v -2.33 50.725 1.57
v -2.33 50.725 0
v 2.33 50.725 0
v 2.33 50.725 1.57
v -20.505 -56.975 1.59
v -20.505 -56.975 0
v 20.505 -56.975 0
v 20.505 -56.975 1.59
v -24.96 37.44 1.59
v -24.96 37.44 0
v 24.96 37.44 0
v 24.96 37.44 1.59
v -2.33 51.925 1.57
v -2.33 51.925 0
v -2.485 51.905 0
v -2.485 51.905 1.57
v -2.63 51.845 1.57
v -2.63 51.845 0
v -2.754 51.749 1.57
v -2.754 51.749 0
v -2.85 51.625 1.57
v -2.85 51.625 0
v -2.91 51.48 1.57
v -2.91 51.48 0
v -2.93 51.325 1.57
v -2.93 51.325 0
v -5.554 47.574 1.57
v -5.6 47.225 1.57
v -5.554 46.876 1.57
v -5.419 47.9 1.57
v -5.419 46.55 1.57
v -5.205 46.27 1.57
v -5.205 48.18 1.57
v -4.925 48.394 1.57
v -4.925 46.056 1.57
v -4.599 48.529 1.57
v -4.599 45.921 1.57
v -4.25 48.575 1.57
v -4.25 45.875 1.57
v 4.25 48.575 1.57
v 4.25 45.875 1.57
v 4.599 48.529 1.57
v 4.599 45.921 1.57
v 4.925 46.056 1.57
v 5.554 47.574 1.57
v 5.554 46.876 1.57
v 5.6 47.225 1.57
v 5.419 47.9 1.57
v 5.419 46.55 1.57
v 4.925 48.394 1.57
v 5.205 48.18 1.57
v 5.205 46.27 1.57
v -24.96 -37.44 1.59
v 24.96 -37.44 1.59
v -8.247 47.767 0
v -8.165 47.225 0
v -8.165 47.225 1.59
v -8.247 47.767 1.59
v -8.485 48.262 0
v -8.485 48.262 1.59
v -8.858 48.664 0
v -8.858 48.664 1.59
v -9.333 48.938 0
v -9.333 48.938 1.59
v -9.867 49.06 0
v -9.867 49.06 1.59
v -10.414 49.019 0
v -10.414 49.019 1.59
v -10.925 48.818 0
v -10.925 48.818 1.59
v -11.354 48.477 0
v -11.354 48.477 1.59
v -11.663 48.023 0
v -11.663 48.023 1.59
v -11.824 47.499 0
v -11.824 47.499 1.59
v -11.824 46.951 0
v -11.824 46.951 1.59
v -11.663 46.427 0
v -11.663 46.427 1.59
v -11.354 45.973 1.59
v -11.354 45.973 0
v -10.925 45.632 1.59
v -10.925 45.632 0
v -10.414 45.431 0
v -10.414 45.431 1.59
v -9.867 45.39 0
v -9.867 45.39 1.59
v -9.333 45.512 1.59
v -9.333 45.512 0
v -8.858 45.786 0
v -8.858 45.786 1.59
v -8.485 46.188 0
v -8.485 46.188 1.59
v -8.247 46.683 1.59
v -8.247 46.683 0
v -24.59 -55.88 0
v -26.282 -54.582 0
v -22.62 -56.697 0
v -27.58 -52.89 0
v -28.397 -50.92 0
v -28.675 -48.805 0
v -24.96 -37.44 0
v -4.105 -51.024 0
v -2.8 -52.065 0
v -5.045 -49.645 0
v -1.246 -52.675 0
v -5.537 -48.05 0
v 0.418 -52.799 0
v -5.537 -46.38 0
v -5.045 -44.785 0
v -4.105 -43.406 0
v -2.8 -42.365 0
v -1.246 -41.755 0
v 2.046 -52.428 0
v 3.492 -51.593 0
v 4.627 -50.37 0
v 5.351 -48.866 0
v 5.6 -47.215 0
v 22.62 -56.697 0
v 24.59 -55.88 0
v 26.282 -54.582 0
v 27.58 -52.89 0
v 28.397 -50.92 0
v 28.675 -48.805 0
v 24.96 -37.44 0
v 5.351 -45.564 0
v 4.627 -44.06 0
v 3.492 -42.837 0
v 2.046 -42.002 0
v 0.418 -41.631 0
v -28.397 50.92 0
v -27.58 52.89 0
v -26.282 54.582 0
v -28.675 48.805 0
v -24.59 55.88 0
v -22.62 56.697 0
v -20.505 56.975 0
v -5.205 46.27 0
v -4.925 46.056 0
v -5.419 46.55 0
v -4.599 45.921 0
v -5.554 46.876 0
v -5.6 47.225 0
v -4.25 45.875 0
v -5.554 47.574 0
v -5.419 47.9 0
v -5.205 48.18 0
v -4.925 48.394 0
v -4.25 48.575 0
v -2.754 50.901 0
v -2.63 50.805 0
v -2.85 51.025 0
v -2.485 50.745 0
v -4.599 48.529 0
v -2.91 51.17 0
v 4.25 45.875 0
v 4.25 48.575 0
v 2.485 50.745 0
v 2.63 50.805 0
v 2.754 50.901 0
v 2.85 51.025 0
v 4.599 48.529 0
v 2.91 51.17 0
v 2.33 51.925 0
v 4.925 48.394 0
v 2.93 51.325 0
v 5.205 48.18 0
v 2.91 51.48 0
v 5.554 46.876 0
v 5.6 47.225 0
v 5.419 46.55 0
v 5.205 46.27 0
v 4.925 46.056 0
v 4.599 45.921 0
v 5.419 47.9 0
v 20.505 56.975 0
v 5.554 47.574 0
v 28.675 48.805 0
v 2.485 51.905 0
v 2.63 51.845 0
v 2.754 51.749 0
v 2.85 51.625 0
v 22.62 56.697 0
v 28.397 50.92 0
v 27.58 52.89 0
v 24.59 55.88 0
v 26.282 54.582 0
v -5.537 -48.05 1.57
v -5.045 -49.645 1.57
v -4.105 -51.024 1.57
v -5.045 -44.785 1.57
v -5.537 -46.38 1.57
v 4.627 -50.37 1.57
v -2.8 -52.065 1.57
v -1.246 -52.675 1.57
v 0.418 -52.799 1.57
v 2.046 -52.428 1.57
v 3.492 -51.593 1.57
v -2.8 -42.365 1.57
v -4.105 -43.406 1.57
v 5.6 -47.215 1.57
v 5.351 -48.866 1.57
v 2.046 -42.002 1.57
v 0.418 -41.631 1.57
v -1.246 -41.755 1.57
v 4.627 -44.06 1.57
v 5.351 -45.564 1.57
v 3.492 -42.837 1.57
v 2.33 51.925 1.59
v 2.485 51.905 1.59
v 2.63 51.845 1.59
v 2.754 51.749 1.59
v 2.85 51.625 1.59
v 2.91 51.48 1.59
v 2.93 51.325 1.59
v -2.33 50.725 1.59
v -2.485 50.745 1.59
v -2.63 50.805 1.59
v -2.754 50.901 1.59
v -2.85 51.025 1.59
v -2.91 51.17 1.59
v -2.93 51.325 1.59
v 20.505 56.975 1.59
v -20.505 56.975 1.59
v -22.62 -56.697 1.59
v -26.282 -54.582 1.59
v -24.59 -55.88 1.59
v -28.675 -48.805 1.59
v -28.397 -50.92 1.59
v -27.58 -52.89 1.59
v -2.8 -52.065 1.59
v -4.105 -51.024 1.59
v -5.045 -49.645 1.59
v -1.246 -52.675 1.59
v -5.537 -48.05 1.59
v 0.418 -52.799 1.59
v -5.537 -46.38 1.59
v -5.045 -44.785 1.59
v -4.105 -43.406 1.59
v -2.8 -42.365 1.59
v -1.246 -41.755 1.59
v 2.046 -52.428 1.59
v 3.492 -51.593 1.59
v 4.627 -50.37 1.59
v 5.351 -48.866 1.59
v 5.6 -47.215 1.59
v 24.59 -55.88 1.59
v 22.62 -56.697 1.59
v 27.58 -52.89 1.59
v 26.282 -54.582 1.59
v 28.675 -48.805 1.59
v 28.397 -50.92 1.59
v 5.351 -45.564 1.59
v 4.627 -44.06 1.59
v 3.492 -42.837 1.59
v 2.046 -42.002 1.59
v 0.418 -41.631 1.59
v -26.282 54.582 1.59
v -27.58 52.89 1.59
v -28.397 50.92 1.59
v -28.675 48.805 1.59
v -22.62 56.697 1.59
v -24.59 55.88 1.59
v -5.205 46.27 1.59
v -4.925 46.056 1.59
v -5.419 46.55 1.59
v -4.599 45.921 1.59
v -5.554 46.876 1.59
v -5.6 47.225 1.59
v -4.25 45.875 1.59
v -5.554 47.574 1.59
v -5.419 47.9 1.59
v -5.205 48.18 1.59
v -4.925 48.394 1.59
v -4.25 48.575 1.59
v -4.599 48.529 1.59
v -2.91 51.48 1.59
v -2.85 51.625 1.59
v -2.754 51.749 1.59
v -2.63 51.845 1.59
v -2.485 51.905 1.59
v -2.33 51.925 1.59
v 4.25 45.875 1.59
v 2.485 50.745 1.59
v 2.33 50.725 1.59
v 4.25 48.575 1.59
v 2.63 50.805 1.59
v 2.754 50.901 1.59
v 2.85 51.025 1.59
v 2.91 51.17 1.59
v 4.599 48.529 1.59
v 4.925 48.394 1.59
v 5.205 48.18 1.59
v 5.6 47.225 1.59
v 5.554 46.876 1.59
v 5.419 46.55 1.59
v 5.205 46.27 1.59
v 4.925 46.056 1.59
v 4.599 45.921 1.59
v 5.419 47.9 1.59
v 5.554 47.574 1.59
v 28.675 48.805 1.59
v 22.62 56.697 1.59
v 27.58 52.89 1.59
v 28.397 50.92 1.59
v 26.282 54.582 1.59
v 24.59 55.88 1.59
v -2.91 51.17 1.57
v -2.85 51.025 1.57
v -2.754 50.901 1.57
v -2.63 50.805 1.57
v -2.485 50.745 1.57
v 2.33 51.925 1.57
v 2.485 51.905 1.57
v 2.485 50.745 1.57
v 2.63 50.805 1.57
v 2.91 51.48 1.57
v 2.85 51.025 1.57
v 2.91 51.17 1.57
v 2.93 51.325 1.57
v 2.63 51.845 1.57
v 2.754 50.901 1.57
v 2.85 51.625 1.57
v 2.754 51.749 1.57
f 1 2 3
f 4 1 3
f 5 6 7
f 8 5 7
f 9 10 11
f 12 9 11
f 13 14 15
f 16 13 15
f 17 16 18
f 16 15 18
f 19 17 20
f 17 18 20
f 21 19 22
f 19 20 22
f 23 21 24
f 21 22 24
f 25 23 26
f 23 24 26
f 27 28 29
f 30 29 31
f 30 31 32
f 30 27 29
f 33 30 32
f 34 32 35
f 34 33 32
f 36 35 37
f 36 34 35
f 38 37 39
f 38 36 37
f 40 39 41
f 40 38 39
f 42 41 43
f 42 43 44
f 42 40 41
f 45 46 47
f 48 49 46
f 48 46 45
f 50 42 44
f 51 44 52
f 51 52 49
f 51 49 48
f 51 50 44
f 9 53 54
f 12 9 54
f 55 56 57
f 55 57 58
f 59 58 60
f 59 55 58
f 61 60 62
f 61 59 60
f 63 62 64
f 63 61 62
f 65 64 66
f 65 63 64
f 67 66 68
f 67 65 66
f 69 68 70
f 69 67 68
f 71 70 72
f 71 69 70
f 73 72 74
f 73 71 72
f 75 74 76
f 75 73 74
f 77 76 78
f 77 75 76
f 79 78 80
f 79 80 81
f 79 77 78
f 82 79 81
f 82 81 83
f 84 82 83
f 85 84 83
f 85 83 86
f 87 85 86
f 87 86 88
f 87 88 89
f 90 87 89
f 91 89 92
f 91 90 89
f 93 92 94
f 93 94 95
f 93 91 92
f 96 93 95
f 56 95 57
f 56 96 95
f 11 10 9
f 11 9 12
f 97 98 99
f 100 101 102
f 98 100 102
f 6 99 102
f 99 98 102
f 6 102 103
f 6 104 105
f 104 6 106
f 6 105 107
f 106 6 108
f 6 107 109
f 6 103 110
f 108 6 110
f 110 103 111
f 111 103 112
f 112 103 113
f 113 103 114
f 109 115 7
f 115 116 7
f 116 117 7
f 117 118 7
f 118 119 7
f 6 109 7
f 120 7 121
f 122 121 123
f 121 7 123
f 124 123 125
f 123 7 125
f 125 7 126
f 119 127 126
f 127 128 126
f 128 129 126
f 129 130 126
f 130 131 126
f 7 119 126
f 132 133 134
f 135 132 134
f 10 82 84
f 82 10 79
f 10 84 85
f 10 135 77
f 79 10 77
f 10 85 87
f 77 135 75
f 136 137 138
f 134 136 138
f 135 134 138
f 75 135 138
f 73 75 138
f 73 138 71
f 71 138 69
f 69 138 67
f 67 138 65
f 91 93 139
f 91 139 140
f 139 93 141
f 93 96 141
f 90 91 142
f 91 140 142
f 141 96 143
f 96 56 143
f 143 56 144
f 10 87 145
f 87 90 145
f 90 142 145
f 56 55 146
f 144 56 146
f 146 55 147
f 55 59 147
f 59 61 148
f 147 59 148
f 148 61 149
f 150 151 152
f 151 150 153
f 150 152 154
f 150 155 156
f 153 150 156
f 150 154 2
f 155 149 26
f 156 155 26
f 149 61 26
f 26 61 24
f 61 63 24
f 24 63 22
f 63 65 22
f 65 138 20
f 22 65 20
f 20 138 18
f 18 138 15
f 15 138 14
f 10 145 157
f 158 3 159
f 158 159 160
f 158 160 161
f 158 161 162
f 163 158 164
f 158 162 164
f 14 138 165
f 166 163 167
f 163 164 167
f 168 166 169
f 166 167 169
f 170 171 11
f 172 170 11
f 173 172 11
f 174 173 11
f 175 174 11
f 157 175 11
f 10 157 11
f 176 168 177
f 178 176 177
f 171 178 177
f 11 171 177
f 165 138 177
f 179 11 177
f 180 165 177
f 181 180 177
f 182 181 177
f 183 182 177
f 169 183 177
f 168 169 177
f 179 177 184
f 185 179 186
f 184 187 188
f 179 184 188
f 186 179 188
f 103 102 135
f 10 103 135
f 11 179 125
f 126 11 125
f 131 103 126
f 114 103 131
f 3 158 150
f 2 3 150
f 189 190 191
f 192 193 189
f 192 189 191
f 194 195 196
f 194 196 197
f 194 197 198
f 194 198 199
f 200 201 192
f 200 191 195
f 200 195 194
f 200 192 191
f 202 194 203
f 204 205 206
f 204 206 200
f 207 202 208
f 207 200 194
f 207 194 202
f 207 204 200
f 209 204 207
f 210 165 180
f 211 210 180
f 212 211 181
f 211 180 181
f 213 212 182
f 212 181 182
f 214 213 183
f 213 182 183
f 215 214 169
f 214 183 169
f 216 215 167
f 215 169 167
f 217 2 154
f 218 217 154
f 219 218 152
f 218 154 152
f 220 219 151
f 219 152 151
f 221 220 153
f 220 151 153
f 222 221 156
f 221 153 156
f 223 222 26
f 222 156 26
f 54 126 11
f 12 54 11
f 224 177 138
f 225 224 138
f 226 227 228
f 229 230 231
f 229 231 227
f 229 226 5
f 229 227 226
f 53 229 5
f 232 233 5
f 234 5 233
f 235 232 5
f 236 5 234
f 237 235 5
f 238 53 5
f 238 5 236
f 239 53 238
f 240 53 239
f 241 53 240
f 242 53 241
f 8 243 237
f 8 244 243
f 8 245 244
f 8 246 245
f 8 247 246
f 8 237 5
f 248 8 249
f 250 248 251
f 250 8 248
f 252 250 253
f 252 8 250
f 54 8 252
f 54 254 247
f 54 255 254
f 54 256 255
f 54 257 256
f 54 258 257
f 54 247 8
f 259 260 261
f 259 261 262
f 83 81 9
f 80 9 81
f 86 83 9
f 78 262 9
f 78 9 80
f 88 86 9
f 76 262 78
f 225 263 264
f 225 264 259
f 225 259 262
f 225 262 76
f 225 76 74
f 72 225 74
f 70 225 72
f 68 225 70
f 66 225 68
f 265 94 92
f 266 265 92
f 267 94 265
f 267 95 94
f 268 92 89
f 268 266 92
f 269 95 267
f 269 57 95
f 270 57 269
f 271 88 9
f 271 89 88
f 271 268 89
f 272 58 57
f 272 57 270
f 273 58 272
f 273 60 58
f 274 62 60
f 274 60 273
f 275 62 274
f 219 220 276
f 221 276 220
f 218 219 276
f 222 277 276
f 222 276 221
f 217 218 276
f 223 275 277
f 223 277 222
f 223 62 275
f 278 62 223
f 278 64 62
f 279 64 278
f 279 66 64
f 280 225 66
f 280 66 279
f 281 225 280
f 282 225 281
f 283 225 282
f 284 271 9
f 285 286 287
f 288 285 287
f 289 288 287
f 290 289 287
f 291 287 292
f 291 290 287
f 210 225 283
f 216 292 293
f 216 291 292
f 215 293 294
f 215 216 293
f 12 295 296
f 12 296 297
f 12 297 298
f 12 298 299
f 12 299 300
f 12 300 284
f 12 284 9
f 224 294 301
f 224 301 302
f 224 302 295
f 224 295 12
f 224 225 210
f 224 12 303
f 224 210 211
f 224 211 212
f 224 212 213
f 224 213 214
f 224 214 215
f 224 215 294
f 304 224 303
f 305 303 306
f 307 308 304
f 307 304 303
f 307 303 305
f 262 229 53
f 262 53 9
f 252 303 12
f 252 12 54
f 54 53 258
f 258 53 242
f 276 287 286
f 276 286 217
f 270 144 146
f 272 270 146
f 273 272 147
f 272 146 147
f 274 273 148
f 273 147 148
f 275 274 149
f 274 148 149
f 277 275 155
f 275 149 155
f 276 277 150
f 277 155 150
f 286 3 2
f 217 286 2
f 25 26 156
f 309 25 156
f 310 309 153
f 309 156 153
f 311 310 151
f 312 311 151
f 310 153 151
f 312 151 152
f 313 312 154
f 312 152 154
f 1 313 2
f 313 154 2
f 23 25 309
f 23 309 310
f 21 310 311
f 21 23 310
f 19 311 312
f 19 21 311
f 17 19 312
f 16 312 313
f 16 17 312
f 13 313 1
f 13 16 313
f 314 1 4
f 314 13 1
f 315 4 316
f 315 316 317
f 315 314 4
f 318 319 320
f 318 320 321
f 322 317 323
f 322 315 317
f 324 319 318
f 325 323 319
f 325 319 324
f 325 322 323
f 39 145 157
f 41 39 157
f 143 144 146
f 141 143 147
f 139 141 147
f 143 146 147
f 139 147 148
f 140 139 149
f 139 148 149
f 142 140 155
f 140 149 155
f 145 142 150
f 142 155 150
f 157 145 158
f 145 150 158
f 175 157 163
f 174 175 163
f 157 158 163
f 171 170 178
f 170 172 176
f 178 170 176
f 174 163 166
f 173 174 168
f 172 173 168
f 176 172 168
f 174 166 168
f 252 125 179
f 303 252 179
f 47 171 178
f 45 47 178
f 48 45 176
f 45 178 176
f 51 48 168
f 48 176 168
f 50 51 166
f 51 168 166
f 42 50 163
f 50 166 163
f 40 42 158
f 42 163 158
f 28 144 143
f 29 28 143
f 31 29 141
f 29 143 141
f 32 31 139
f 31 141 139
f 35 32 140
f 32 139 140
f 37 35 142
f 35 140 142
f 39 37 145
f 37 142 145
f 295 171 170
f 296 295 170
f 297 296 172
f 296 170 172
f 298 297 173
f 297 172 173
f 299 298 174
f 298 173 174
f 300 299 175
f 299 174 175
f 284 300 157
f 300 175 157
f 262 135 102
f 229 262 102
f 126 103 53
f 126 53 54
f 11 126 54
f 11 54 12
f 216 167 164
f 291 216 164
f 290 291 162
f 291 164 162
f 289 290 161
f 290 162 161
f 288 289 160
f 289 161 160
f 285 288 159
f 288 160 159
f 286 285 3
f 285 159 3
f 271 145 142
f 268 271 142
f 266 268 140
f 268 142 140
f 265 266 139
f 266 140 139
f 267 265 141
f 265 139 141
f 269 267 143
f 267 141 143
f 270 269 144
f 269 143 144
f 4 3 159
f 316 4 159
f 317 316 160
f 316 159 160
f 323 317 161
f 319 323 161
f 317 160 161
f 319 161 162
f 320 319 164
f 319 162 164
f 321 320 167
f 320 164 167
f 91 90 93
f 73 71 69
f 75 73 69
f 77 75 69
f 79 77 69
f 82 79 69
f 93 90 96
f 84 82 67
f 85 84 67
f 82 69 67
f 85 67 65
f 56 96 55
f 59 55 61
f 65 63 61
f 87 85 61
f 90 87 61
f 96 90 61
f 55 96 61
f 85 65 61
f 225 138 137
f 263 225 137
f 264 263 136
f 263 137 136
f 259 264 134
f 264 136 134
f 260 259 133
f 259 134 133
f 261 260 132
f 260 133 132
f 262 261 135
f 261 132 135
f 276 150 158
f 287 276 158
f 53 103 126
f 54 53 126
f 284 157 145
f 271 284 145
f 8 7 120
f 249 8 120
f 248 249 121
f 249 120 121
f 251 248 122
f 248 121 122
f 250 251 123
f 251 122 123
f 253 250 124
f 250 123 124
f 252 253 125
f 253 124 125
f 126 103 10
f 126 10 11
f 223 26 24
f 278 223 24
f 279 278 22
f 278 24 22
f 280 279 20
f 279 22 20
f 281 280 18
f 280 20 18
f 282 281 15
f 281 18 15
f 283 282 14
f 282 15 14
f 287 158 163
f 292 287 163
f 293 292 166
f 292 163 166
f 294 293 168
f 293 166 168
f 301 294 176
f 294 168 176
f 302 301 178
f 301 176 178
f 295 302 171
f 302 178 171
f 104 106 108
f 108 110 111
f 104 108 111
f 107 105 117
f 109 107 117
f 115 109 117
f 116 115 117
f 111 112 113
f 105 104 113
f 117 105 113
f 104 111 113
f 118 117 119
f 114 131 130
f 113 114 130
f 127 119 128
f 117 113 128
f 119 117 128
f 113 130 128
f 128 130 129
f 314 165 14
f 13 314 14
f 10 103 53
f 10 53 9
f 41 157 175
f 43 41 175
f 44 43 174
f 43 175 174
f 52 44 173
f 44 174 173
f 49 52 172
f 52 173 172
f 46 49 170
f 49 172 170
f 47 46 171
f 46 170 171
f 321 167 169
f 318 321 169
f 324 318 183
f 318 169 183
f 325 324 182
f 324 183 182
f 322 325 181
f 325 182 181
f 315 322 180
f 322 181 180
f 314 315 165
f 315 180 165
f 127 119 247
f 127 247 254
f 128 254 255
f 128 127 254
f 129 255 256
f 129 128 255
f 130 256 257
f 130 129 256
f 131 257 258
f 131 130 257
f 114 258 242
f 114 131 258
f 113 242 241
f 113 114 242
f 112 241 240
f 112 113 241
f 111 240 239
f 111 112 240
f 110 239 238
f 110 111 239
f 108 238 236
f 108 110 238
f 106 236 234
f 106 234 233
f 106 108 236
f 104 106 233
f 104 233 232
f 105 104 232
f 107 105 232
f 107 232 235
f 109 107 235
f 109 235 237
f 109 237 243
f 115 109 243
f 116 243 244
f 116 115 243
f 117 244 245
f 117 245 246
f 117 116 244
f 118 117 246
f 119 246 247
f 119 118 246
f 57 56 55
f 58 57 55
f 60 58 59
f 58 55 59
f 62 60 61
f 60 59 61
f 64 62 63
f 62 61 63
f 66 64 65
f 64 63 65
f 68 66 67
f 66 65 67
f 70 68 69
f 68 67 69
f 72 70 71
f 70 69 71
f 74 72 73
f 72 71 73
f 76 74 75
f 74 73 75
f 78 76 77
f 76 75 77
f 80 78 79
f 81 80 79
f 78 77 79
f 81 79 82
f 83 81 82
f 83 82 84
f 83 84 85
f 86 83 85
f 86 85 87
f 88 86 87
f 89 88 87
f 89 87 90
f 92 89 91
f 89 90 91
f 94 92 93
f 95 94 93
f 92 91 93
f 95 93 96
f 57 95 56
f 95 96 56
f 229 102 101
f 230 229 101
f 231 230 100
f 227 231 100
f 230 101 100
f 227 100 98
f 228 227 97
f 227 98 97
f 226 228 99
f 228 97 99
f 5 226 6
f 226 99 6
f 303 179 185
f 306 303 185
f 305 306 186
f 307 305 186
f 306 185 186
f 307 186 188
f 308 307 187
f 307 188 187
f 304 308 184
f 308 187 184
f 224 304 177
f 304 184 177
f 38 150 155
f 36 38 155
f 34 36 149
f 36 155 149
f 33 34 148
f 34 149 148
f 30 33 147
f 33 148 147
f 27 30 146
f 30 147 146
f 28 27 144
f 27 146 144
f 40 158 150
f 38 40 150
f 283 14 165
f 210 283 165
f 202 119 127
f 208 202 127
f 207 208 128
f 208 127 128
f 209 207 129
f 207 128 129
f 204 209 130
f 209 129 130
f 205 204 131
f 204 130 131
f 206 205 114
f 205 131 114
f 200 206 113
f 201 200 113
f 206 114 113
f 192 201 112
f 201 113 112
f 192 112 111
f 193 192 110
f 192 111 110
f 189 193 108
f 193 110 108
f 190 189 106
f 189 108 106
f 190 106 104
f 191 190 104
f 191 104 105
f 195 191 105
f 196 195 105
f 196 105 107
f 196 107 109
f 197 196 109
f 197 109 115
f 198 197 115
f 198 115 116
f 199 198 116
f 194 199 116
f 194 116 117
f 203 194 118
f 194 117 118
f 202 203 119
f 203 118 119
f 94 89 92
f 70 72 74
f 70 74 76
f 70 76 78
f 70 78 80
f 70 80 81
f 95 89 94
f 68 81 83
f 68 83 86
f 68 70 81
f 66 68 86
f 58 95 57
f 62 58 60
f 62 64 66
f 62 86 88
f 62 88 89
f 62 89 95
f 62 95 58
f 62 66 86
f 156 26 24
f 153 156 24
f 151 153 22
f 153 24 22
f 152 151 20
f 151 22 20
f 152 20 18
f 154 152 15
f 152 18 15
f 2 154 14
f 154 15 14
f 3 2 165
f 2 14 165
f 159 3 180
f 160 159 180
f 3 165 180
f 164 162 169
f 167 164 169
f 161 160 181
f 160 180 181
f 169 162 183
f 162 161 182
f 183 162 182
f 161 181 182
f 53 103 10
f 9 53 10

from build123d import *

# Parameters (mm, degrees)
F0_R     = 5.6
F0_W     = 49.92
F0_H     = 74.88
F0_R_2   = 1.84
F1_DEPTH = 1.59
F2_DEPTH = 1.59
F3_DEPTH = 1.57
F4_DEPTH = 1.59
F5_DEPTH = 1.57


with BuildPart() as f1:
    # F0 (on Top) → F1 (new body)
    with BuildSketch(Plane.XY):
        with BuildLine():
            Line((20.505, 56.975), (-20.505, 56.975))
            ThreePointArc((-20.505, 56.975), (-26.282062, 54.582062), (-28.675, 48.805))
            Line((-28.675, 48.805), (-28.675, -48.805))
            ThreePointArc((-28.675, -48.805), (-26.282062, -54.582062), (-20.505, -56.975))
            Line((-20.505, -56.975), (20.505, -56.975))
            ThreePointArc((20.505, -56.975), (26.282062, -54.582062), (28.675, -48.805))
            Line((28.675, -48.805), (28.675, 48.805))
            ThreePointArc((28.675, 48.805), (26.282062, 54.582062), (20.505, 56.975))
        make_face()
        with Locations((0, -47.215)):
            Circle(F0_R, mode=Mode.SUBTRACT)
        Rectangle(F0_W, F0_H, mode=Mode.SUBTRACT)
        with Locations((-10.005, 47.225)):
            Circle(F0_R_2, mode=Mode.SUBTRACT)
        with BuildLine():
            ThreePointArc((5.6, 47.225), (5.204594, 46.270406), (4.25, 45.875))
            Line((4.25, 45.875), (-4.25, 45.875))
            ThreePointArc((-4.25, 45.875), (-5.204594, 46.270406), (-5.6, 47.225))
            ThreePointArc((-5.6, 47.225), (-5.204594, 48.179594), (-4.25, 48.575))
            Line((-4.25, 48.575), (4.25, 48.575))
            ThreePointArc((4.25, 48.575), (5.204594, 48.179594), (5.6, 47.225))
        make_face(mode=Mode.SUBTRACT)
        with BuildLine():
            ThreePointArc((-2.93, 51.325), (-2.754264, 51.749264), (-2.33, 51.925))
            Line((-2.33, 51.925), (2.33, 51.925))
            ThreePointArc((2.33, 51.925), (2.754264, 51.749264), (2.93, 51.325))
            ThreePointArc((2.93, 51.325), (2.754264, 50.900736), (2.33, 50.725))
            Line((2.33, 50.725), (-2.33, 50.725))
            ThreePointArc((-2.33, 50.725), (-2.754264, 50.900736), (-2.93, 51.325))
        make_face(mode=Mode.SUBTRACT)
    extrude(amount=F1_DEPTH)


with BuildPart() as f2:
    # F0 (on Top) → F2 (new body)
    with BuildSketch(Plane.XY):
        Rectangle(F0_W, F0_H)
    extrude(amount=F2_DEPTH)


with BuildPart() as f3:
    # F0 (on Top) → F3 (new body)
    with BuildSketch(Plane.XY):
        with BuildLine():
            Line((-4.25, 45.875), (4.25, 45.875))
            ThreePointArc((4.25, 45.875), (5.204594, 46.270406), (5.6, 47.225))
            ThreePointArc((5.6, 47.225), (5.204594, 48.179594), (4.25, 48.575))
            Line((4.25, 48.575), (-4.25, 48.575))
            ThreePointArc((-4.25, 48.575), (-5.204594, 48.179594), (-5.6, 47.225))
            ThreePointArc((-5.6, 47.225), (-5.204594, 46.270406), (-4.25, 45.875))
        make_face()
        with BuildLine():
            Line((2.33, 51.925), (-2.33, 51.925))
            ThreePointArc((-2.33, 51.925), (-2.754264, 51.749264), (-2.93, 51.325))
            ThreePointArc((-2.93, 51.325), (-2.754264, 50.900736), (-2.33, 50.725))
            Line((-2.33, 50.725), (2.33, 50.725))
            ThreePointArc((2.33, 50.725), (2.754264, 50.900736), (2.93, 51.325))
            ThreePointArc((2.93, 51.325), (2.754264, 51.749264), (2.33, 51.925))
        make_face()
    extrude(amount=F3_DEPTH)


with BuildPart() as f4:
    # F0 (on Top) → F4 (new body)
    with BuildSketch(Plane.XY):
        with Locations((-10.005, 47.225)):
            Circle(F0_R_2)
    extrude(amount=F4_DEPTH)


with BuildPart() as f5:
    # F0 (on Top) → F5 (new body)
    with BuildSketch(Plane.XY):
        with Locations((0, -47.215)):
            Circle(F0_R)
    extrude(amount=F5_DEPTH)


solid = Compound([f1.part, f2.part, f3.part, f4.part, f5.part])
